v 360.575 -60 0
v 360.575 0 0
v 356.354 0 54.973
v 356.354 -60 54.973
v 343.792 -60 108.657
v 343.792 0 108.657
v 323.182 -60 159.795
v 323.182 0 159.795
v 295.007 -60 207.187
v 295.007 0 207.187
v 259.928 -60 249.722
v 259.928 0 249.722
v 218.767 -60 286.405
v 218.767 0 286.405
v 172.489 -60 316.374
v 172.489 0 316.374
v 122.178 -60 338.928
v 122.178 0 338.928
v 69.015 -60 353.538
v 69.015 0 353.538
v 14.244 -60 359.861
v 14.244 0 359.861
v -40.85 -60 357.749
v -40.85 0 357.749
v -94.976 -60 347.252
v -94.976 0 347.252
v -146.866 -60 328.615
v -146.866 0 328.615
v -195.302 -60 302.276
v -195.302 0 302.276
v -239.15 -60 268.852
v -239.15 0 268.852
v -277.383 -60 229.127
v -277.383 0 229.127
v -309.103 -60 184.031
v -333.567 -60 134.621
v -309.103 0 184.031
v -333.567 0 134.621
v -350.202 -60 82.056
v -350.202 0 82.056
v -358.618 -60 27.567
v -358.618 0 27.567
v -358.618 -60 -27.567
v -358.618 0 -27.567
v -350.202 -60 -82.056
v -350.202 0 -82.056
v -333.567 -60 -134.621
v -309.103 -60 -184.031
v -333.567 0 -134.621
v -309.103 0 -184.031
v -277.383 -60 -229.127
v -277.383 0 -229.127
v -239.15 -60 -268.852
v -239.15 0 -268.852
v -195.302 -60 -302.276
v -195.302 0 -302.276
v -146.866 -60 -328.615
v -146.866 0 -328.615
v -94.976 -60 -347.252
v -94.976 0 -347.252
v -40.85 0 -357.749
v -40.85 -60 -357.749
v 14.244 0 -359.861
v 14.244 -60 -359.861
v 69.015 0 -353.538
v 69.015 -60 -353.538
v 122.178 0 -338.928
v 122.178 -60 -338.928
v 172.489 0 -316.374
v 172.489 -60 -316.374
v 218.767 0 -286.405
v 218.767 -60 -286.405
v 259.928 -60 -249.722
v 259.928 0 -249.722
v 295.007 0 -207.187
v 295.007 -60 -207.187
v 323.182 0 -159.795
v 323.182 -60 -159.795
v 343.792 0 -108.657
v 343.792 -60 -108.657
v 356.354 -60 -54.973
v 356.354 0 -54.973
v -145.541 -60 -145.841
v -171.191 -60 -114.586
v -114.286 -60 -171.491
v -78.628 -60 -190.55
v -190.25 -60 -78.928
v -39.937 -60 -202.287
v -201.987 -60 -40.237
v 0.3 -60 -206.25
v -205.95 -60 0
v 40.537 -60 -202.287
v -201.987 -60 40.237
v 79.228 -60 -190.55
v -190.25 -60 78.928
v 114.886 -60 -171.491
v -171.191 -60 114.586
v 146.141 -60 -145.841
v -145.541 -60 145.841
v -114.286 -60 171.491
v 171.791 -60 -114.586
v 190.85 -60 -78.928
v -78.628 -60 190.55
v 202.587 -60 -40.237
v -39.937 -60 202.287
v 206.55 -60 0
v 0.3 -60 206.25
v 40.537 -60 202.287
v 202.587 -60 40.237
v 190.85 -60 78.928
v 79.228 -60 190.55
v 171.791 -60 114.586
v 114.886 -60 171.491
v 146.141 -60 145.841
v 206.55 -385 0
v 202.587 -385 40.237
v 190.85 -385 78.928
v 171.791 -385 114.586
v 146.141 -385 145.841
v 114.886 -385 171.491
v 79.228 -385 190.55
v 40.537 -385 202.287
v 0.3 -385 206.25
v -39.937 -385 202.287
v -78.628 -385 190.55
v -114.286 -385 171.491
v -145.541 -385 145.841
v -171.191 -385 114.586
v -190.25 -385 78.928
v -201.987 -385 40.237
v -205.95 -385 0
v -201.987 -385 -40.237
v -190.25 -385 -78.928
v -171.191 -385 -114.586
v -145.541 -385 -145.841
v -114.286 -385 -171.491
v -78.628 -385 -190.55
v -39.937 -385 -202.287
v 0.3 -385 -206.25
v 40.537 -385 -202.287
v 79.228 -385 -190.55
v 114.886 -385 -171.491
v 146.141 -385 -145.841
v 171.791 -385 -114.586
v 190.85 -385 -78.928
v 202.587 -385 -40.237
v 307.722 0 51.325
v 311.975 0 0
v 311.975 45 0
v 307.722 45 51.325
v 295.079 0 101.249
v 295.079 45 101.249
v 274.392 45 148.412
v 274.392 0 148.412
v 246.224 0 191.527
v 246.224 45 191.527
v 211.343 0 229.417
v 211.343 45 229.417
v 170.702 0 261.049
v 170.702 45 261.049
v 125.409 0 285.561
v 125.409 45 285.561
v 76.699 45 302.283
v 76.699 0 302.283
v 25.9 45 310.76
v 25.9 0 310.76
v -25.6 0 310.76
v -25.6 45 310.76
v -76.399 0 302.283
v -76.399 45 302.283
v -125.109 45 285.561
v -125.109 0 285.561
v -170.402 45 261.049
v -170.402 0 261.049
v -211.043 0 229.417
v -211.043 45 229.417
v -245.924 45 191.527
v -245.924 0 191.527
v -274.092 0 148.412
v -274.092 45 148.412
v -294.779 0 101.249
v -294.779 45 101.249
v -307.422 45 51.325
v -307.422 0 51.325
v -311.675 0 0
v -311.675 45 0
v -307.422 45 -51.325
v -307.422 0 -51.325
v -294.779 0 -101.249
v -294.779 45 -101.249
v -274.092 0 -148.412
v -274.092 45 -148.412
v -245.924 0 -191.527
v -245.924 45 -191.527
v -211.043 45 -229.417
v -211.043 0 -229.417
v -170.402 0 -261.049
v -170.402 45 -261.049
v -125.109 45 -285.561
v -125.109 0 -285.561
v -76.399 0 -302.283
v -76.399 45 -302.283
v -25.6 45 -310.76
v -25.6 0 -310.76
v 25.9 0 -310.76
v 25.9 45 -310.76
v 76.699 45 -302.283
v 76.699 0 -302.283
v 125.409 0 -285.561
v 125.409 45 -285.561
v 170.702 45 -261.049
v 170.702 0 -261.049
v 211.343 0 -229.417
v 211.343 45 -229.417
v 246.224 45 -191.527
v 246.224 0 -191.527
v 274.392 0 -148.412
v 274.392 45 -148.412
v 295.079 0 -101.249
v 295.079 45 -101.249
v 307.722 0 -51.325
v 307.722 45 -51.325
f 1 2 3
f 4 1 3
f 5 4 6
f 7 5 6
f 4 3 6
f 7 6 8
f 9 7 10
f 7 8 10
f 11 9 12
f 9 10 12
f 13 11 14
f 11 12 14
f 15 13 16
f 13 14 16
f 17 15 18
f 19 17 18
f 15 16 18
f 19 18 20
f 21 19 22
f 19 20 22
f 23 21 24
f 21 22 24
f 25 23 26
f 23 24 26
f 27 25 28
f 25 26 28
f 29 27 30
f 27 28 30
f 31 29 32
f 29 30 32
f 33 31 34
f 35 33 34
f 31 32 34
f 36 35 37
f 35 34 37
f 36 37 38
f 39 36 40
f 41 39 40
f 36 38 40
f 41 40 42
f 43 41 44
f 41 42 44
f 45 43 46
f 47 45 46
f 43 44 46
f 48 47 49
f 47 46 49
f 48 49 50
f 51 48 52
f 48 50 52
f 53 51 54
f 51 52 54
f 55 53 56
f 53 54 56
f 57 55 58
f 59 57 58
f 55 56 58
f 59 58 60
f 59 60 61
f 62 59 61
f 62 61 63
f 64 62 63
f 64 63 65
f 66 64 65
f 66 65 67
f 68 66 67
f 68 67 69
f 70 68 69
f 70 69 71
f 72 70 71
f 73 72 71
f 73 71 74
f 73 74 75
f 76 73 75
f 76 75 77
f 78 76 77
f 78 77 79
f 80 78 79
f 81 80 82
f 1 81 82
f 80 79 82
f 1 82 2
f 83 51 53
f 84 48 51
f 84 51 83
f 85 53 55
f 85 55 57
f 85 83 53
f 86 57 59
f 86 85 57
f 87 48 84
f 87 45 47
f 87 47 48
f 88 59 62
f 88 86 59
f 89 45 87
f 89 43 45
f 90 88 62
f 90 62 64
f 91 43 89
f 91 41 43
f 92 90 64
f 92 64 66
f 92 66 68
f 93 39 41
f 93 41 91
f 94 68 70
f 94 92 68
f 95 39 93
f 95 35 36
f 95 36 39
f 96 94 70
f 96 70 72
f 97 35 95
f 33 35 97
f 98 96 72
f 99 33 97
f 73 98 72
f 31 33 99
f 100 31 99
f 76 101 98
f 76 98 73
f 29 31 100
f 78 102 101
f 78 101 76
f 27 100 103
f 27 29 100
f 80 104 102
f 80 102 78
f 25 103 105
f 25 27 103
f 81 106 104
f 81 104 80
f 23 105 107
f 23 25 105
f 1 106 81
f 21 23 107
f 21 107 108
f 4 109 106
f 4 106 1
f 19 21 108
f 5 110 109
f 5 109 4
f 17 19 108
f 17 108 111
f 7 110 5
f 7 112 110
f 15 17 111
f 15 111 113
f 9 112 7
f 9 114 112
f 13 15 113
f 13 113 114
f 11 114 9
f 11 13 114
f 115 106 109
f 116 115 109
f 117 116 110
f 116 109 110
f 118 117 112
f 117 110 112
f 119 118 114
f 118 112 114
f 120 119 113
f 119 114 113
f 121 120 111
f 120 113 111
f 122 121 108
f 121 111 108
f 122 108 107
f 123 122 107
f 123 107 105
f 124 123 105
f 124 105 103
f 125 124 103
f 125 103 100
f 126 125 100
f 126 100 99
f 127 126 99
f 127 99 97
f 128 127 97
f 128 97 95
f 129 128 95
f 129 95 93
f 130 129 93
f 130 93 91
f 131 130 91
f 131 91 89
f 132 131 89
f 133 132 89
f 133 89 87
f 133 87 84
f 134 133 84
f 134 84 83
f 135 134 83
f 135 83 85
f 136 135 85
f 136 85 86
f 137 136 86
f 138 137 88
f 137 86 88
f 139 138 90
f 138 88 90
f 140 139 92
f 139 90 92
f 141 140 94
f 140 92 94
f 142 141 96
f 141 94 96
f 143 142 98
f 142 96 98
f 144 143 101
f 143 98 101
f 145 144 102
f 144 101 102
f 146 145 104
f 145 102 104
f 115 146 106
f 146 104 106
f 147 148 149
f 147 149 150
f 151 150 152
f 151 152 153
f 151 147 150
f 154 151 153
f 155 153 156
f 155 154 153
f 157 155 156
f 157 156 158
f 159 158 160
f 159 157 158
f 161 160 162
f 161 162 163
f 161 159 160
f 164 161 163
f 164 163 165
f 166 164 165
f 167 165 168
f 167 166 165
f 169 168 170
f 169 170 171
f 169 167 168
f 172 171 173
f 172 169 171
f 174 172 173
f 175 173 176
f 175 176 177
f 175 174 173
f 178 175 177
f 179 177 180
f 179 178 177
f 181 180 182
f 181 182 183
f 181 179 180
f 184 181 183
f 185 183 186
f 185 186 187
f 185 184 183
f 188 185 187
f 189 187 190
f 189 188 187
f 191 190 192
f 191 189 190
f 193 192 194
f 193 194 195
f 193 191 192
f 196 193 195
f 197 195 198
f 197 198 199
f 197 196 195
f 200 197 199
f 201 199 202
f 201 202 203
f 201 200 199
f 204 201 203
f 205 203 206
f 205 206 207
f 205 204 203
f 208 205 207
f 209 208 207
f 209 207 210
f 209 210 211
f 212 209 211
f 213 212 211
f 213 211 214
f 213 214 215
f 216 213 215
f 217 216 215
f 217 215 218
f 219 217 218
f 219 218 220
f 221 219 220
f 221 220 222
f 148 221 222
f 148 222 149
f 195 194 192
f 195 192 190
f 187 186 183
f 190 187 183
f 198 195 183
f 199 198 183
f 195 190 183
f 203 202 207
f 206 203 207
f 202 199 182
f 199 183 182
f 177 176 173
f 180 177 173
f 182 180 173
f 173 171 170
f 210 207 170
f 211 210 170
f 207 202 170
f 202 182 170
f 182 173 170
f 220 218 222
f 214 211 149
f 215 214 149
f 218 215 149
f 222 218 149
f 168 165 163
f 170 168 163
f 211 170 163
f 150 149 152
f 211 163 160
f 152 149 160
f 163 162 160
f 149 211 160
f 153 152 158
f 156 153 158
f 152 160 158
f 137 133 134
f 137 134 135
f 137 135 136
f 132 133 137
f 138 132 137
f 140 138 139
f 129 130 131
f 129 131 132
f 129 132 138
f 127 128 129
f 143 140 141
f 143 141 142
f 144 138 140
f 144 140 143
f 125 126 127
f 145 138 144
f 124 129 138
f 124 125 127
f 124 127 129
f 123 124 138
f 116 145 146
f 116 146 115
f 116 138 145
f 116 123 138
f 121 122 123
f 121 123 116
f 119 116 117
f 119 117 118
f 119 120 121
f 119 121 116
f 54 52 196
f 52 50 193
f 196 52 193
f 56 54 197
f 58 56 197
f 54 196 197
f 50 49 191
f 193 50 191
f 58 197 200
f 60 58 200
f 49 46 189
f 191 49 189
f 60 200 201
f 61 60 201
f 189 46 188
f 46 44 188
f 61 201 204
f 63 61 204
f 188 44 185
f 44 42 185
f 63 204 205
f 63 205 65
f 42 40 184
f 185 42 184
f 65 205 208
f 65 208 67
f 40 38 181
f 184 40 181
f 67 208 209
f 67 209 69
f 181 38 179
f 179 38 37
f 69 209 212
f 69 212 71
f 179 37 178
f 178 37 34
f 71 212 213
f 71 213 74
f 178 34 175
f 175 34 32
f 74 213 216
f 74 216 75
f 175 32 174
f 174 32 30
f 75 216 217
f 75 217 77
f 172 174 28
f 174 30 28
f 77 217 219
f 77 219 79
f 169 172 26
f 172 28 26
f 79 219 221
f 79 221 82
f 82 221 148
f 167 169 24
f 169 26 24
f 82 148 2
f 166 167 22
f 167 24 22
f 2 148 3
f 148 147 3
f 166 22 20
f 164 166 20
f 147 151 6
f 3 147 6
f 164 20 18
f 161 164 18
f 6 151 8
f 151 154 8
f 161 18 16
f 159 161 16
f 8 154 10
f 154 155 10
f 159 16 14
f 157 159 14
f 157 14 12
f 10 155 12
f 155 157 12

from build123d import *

# Parameters (mm, degrees)
F3_R     = 311.825
F4_DEPTH = 45
F5_R     = 206.25
F6_DEPTH = 385
F7_R     = 360.125
F8_DEPTH = 60


with BuildPart() as f4:
    # F3 (on Front) → F4 (new body)
    with BuildSketch(Plane.XZ):
        with Locations((0.15, 0)):
            Circle(F3_R)
    extrude(amount=-F4_DEPTH)

    # F5 (on face) → F6 (join)
    with BuildSketch(Plane.XZ):
        with Locations((0.3, 0)):
            Circle(F5_R)
    extrude(amount=F6_DEPTH)

    # F7 (on face) → F8 (join)
    with BuildSketch(Plane.XZ):
        with Locations((0.45, 0)):
            Circle(F7_R)
    extrude(amount=F8_DEPTH)


solid = f4.part
